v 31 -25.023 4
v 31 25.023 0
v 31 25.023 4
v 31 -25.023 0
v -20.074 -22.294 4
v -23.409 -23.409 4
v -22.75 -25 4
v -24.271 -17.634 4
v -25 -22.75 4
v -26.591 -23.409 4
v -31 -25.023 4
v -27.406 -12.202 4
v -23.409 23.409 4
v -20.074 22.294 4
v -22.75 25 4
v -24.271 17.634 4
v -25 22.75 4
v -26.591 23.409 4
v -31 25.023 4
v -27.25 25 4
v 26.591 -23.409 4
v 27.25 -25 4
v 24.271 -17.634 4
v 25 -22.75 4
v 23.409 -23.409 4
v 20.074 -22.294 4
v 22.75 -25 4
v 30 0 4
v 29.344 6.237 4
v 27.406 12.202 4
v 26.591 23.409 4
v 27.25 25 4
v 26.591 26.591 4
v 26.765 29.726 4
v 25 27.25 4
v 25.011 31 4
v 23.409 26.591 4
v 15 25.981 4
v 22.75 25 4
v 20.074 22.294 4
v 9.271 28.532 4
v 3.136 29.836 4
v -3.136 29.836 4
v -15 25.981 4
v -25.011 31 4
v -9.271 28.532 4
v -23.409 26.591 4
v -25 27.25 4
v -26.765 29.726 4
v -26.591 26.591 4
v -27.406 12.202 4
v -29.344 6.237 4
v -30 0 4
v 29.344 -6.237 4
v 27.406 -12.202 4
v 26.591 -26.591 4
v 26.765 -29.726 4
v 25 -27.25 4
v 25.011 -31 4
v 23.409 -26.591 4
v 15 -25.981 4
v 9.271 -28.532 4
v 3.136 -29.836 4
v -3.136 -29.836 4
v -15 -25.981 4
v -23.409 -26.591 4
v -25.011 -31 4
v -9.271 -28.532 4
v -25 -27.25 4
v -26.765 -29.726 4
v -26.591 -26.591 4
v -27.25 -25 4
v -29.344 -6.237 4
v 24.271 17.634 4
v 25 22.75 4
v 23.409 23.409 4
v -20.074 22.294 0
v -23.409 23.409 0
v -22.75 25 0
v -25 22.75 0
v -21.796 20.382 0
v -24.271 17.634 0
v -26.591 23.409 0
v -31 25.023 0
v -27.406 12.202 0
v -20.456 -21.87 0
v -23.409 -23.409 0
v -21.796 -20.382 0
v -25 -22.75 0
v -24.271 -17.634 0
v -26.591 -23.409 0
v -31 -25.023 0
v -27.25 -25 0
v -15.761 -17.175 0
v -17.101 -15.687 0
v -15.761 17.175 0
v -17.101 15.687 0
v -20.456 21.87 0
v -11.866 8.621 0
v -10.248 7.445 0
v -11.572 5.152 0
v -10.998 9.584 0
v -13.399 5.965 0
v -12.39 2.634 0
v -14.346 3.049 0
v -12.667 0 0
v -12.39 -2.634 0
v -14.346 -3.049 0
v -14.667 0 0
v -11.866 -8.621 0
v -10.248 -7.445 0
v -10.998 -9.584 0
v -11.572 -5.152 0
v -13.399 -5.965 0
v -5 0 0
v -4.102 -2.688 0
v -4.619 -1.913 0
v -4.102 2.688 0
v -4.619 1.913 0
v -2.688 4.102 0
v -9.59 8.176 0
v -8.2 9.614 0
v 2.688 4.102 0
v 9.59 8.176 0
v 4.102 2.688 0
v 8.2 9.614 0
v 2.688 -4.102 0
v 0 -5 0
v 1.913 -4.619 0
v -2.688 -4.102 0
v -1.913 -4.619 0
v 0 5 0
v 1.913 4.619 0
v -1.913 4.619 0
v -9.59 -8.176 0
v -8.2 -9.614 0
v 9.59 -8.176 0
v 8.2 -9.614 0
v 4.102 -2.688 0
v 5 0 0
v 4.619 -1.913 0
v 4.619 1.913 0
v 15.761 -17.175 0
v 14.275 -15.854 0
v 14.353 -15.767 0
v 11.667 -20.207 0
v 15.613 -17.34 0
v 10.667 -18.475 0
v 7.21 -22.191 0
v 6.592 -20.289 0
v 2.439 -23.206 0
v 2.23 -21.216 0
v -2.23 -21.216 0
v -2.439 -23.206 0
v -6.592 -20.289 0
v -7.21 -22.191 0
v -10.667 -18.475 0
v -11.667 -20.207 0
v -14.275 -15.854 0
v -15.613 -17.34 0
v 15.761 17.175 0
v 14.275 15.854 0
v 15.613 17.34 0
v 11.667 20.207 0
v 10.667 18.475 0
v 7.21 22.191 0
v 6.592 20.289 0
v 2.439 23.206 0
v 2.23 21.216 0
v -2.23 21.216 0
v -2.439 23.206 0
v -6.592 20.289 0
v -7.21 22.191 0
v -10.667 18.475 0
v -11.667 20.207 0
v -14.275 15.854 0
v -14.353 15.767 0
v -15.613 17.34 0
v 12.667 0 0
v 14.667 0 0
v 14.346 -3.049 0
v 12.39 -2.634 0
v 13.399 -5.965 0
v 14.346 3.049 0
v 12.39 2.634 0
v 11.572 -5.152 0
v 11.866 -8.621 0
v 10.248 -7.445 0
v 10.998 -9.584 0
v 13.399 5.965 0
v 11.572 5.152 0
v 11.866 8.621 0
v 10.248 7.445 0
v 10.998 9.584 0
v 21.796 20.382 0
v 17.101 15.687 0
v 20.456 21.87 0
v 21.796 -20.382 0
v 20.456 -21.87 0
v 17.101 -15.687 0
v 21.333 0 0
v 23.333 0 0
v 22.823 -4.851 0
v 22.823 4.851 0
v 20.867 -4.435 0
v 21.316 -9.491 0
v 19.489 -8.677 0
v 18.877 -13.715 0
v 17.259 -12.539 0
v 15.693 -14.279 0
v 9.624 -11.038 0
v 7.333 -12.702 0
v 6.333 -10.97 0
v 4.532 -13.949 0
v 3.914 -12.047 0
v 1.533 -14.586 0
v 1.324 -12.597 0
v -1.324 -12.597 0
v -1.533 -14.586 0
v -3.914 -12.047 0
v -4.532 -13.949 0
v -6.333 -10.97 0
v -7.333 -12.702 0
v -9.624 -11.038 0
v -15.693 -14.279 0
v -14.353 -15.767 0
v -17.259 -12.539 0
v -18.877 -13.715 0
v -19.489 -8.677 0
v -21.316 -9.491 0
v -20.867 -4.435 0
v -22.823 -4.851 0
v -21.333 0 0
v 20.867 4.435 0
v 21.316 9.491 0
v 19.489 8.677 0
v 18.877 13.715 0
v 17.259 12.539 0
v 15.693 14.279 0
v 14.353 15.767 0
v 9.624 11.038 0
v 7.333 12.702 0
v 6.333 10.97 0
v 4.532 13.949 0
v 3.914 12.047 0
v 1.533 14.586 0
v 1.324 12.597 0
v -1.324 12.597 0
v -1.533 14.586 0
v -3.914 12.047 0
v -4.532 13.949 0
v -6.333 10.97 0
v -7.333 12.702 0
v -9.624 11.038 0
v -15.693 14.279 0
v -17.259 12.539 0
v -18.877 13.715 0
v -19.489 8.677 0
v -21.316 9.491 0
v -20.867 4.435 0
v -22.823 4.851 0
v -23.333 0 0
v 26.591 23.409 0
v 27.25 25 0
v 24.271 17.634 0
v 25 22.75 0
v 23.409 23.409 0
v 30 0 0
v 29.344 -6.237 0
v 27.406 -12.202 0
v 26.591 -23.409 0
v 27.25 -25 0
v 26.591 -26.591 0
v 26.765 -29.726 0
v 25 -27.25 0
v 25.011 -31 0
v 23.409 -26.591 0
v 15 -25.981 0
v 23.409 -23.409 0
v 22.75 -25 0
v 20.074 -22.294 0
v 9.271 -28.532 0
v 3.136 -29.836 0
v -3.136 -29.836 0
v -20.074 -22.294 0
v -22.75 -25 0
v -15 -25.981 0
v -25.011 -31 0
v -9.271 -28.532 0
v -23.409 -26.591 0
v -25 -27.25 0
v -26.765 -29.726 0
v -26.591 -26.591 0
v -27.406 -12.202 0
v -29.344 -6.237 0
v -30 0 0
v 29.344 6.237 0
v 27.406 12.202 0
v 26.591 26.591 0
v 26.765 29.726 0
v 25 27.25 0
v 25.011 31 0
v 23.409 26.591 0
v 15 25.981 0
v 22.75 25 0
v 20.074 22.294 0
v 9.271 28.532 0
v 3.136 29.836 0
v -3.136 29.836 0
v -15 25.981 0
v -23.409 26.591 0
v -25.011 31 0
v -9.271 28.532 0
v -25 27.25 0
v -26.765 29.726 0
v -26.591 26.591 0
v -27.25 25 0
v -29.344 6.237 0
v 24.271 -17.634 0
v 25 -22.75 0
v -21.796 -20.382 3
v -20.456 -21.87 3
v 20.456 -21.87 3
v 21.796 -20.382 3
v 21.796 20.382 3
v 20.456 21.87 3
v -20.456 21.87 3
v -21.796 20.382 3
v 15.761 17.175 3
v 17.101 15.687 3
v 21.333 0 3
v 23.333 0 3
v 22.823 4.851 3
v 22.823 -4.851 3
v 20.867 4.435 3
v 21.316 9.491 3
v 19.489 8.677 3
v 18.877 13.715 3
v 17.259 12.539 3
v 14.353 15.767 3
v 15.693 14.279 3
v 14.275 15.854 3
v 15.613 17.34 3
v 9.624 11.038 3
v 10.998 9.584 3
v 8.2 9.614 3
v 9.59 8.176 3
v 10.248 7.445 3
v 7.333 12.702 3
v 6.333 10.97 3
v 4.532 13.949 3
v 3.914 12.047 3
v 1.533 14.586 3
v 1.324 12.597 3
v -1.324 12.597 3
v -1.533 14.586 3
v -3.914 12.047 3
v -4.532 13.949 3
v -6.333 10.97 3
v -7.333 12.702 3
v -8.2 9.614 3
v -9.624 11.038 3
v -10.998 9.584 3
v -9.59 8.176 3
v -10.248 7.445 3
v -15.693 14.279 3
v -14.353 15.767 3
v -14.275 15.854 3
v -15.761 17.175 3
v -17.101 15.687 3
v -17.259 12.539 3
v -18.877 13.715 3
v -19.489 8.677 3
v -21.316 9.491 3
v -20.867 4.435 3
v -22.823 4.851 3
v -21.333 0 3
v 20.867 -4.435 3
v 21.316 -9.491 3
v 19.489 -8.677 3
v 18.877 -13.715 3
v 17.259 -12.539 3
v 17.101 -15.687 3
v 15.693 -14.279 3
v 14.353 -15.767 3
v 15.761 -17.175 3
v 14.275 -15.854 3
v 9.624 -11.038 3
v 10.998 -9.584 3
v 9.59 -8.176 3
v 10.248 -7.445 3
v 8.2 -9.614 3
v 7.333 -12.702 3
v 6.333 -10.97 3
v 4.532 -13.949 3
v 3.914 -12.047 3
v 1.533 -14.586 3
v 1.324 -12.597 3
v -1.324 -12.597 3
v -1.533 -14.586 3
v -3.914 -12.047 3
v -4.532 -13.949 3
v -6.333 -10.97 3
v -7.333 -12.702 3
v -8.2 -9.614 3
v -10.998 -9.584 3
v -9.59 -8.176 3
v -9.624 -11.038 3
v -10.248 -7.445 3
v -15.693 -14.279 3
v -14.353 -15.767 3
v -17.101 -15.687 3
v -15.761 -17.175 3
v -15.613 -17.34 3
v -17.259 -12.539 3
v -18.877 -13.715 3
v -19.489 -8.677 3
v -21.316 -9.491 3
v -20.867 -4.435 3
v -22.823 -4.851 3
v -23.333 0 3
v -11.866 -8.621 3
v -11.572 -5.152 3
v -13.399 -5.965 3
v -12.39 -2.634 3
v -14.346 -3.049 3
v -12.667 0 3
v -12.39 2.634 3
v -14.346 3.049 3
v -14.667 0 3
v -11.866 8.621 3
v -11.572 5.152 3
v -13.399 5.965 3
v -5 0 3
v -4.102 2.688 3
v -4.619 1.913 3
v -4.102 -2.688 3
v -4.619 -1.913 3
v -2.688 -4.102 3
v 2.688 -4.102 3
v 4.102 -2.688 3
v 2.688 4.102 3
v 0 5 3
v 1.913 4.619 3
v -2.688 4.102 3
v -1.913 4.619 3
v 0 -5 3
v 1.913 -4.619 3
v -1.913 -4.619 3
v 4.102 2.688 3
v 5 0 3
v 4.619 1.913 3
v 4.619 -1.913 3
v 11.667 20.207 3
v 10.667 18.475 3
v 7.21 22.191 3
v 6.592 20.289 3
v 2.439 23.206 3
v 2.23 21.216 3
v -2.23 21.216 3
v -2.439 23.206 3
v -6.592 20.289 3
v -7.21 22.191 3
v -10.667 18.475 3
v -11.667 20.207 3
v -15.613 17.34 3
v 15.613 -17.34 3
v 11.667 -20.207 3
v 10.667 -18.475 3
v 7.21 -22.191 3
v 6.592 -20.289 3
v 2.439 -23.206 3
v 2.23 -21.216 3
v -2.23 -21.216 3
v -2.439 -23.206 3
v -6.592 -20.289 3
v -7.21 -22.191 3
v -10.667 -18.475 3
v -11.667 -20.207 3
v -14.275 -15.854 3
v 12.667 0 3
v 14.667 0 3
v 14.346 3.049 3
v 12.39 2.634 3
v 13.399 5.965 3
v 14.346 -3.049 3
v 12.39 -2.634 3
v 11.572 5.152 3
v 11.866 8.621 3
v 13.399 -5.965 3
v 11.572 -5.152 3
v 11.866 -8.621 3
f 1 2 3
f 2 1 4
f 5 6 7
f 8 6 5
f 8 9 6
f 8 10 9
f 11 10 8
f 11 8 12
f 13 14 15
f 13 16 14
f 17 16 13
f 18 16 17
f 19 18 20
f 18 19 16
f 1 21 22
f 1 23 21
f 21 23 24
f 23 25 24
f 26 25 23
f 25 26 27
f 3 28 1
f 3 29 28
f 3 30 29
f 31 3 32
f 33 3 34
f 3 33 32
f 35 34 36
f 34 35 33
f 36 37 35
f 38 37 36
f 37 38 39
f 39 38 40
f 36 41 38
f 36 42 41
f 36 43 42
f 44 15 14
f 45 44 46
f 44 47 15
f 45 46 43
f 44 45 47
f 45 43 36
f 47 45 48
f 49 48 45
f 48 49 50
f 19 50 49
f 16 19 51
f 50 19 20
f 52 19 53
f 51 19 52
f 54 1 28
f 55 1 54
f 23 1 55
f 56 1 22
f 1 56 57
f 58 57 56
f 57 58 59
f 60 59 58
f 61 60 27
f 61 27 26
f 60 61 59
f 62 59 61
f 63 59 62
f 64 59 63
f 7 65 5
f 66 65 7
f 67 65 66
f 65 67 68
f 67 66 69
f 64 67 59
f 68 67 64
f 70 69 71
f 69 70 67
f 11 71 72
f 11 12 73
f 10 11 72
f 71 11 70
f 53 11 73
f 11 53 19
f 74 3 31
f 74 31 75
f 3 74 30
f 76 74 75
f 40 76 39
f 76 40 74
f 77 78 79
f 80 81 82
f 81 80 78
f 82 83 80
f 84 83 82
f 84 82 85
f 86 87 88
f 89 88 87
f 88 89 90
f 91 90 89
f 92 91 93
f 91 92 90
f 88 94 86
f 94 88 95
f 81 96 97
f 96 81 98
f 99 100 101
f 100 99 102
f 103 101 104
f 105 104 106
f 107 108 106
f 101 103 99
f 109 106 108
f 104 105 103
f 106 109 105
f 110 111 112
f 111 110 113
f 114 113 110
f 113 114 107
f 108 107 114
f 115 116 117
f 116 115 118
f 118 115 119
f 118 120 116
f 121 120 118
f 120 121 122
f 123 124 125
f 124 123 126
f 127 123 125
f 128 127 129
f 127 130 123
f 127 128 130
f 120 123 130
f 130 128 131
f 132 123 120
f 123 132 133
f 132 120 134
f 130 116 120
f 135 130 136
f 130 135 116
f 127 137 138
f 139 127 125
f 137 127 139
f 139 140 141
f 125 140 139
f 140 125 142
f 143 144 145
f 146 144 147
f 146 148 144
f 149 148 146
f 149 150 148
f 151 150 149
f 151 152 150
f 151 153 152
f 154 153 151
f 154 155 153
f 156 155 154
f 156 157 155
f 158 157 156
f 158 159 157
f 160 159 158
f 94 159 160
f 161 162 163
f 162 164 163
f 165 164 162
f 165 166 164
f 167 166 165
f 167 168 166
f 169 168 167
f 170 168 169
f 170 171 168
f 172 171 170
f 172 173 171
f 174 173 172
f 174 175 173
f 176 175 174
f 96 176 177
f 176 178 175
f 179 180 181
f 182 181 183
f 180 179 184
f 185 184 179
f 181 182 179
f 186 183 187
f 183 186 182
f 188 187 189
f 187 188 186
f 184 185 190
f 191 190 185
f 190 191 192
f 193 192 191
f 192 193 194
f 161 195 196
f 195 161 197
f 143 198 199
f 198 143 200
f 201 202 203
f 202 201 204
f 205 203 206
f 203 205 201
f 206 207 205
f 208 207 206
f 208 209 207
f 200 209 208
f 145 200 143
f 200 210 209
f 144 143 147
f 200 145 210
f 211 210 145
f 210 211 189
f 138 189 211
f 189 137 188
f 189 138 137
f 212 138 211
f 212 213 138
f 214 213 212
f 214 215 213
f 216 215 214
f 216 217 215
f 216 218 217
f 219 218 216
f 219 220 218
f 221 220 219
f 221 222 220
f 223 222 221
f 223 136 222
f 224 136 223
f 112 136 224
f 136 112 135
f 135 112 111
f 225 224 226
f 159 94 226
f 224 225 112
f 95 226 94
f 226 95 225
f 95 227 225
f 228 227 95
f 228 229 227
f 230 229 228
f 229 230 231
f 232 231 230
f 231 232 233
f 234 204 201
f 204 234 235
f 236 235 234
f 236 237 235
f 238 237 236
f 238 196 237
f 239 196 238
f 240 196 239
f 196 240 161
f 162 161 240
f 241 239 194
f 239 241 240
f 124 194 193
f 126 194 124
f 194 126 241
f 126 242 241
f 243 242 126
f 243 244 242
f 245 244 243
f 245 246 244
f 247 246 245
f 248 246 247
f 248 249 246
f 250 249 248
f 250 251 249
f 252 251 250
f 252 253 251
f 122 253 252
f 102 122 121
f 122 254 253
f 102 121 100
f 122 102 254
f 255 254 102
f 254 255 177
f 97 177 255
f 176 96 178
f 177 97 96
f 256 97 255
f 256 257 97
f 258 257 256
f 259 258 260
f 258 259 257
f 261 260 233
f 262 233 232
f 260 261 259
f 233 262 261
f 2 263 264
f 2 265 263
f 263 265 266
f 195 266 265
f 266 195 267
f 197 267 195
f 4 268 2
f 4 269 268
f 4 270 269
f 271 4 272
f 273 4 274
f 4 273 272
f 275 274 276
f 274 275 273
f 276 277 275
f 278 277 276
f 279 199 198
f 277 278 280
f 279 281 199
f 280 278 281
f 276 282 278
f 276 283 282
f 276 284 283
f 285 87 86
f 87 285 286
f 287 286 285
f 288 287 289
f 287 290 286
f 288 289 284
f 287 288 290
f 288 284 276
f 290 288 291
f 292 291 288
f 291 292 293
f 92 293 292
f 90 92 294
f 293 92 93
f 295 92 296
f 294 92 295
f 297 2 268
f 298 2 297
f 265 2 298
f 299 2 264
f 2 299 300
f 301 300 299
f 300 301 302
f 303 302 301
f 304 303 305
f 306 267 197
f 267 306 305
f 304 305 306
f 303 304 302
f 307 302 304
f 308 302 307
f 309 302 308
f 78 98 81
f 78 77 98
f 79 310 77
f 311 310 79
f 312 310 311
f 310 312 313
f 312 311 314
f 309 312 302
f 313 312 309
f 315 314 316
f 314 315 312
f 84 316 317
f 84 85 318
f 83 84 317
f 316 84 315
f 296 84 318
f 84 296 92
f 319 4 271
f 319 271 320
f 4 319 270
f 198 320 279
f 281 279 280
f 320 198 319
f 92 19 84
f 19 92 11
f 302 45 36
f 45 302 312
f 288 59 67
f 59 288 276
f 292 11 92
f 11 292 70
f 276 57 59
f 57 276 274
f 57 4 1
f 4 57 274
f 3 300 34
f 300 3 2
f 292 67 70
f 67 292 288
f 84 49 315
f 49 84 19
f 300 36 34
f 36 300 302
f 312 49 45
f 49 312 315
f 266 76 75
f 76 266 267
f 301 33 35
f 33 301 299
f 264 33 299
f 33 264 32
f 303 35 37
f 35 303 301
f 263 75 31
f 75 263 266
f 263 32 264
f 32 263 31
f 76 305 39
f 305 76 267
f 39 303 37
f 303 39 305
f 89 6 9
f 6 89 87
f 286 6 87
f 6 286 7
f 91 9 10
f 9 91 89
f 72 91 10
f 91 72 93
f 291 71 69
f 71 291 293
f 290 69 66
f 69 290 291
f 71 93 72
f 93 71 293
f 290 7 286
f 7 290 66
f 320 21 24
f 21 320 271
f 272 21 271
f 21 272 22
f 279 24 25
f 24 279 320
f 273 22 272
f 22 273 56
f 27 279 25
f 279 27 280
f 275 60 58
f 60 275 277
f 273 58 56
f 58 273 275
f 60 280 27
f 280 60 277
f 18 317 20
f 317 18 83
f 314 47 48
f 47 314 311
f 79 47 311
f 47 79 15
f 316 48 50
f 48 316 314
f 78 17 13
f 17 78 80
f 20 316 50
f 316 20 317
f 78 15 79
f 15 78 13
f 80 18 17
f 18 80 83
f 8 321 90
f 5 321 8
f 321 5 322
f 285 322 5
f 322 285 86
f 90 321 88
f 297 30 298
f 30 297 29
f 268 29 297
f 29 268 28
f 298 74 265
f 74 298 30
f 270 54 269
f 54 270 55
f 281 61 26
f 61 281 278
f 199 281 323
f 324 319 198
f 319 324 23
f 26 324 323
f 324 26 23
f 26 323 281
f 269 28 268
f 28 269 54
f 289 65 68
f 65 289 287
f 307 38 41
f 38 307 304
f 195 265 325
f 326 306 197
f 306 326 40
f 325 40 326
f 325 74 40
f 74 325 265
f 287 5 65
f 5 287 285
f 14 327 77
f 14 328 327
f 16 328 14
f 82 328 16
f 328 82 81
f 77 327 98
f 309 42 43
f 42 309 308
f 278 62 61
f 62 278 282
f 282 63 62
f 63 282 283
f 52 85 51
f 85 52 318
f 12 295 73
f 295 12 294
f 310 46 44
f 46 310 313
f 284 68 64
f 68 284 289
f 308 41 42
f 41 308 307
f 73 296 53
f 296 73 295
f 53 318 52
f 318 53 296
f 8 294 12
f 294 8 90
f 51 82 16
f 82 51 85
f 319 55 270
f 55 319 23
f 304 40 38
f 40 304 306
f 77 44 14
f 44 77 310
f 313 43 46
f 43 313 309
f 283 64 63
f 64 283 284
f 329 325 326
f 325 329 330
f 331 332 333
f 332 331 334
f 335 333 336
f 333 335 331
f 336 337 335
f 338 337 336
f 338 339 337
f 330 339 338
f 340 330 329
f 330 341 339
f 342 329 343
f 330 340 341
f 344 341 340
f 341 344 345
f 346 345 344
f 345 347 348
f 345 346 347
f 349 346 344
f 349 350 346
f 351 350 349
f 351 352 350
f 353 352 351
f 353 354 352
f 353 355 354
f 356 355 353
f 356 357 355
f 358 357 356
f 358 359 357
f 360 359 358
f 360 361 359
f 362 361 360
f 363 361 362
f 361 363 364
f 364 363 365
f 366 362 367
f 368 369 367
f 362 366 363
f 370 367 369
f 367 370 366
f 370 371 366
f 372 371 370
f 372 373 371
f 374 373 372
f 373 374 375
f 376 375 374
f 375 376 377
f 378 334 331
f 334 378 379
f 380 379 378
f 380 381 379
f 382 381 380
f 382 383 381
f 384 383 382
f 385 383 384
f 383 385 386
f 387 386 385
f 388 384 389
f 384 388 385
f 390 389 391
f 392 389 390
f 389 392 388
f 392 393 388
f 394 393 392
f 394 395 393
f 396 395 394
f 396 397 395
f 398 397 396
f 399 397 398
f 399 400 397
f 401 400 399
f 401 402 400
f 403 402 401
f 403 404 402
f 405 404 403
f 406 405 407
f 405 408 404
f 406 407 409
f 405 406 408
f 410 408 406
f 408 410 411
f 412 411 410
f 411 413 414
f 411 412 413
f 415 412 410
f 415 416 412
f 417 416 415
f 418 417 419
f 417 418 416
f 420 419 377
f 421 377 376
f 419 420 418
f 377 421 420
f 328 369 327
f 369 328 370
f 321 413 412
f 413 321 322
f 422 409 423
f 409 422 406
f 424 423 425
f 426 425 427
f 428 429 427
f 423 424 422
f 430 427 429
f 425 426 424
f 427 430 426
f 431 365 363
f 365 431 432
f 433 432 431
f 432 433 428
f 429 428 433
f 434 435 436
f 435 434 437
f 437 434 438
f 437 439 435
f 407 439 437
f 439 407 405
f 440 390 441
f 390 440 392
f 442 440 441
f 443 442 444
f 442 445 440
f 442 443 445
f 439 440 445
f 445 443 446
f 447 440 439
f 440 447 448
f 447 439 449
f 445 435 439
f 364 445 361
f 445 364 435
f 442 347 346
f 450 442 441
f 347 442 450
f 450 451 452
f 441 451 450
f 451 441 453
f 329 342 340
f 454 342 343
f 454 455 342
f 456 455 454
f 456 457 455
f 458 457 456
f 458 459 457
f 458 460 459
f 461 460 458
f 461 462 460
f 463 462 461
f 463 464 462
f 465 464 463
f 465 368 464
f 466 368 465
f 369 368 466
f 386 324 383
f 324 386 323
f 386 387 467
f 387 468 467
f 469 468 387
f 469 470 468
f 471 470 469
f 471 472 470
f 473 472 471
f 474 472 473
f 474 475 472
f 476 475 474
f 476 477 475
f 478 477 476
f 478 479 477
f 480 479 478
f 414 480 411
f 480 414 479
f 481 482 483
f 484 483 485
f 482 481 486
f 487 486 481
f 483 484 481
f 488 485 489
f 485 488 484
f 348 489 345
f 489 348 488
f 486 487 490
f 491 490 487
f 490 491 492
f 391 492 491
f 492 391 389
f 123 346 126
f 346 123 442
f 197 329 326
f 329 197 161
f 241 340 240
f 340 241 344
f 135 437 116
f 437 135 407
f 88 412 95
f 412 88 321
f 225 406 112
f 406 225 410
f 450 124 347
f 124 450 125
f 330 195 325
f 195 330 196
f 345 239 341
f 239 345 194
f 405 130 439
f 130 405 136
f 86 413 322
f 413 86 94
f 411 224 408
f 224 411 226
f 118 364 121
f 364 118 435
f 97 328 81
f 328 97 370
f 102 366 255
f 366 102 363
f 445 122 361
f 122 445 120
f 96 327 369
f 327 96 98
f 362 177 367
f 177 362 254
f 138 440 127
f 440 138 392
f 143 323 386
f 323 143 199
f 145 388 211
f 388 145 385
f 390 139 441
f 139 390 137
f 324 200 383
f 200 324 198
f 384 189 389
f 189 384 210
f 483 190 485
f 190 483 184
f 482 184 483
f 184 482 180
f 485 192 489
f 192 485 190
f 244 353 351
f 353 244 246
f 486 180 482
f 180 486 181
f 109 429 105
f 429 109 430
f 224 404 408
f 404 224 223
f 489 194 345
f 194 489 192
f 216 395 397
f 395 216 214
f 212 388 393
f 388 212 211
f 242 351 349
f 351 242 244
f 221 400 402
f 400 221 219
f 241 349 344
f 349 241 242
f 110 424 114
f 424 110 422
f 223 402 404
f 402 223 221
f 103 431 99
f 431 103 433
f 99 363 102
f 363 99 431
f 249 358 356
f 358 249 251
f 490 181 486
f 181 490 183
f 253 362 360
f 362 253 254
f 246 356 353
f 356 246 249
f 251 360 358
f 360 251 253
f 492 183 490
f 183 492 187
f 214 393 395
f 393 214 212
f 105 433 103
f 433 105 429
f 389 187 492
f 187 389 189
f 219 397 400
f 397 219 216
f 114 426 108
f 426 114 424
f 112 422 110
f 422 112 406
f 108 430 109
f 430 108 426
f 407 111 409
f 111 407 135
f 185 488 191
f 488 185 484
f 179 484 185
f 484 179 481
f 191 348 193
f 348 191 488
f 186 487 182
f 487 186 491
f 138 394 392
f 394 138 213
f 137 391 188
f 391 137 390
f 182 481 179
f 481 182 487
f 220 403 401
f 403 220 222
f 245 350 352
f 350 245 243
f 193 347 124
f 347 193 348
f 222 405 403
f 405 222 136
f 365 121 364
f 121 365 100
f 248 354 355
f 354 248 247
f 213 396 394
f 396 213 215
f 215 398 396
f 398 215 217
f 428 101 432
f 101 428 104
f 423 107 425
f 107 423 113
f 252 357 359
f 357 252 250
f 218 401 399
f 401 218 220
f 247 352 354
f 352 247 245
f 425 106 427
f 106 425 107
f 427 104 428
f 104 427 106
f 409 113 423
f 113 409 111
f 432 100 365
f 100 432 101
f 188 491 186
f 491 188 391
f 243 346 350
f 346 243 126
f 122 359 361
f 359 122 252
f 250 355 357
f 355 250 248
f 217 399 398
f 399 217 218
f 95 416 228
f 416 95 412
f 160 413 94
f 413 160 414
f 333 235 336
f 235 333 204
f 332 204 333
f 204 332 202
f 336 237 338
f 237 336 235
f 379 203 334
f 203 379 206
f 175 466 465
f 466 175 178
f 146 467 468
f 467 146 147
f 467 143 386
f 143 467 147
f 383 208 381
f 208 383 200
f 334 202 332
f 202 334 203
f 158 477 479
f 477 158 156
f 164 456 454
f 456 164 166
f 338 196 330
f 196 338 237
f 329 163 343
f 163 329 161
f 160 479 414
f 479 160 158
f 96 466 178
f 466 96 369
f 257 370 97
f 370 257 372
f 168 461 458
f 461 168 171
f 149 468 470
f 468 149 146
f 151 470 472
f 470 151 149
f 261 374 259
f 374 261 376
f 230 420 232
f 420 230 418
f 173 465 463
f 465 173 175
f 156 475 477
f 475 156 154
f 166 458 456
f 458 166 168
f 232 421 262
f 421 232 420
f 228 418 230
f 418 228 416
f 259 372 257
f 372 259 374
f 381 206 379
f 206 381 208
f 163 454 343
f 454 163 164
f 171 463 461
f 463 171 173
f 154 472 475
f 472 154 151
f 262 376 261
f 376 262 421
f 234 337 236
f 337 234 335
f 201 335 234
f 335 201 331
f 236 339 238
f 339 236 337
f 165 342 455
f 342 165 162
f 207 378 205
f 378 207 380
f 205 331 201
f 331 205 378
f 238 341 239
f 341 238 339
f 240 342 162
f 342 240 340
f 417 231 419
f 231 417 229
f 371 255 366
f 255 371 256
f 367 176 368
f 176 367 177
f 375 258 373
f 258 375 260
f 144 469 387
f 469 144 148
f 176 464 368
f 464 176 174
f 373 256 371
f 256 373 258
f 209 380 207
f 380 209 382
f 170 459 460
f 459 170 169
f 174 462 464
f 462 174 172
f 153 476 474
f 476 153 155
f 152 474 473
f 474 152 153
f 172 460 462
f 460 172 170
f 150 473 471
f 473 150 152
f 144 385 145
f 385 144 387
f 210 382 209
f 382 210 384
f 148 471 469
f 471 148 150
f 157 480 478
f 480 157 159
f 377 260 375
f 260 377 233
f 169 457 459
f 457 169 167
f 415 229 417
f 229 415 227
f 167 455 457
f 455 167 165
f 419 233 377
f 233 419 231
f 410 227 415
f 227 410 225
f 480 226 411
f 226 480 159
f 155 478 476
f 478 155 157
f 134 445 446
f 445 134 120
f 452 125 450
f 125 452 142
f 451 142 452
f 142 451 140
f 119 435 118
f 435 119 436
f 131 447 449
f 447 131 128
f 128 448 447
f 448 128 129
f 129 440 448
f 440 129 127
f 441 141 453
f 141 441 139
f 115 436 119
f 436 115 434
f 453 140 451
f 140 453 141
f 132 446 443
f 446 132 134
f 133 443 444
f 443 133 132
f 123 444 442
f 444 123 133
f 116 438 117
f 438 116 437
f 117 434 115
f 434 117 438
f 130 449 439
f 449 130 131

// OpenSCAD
// Parametric fan grille
// Revision history:
// Original version: John Ridley Sept 25 2011

// these numbers are good for a 60mm fan
// measurements are in millimeters
hole_spacing = 50;
hole_size = 4.5;	// screw hole size
outer_size = 62;	// size of outer square
corner_cut_radius = 40;	// radius of circle drawn around square to round off the corners
outer_circle_diameter = 60;	// diameter of actual fan
inner_circle_diameter = 10;	// diameter of center support circle
outer_thickness = 4;		// Thickness of square outer frame
inner_thickness = 3;		// Vane thickness - should be less than outer_thickness so the fan blades will not hit

vane_count = 4;			// whatever you like here.
vane_width = 2;
ring_count = 2;
ring_width = 2;


// some calculated values
vane_angle = 360 / vane_count;
// ring_spacing defines the CENTER of each ring (radius)
ring_spacing = (outer_circle_diameter - inner_circle_diameter+ring_width)/(ring_count+1)/2;
//ring_spacing = outer_circle_diameter;
cpu_fan_grille();

module cpu_fan_grille()
{
	union()
	{
	// outer mounting ring is a cube minus the cutouts
	difference()
	{
		intersection()
		{
			translate(v=[-outer_size/2, -outer_size/2,0])
				cube(size=[outer_size, outer_size, outer_thickness]);
			cylinder(r=corner_cut_radius, h=outer_thickness);
		}
		// cut the screw holes
		translate(v=[hole_spacing/2, hole_spacing/2, 0])
			cylinder(h=outer_thickness, r=hole_size/2);
		translate(v=[-hole_spacing/2,- hole_spacing/2, 0])
			cylinder(h=outer_thickness, r=hole_size/2);
		translate(v=[hole_spacing/2,- hole_spacing/2, 0])
			cylinder(h=outer_thickness, r=hole_size/2);
		translate(v=[-hole_spacing/2, hole_spacing/2, 0])
			cylinder(h=outer_thickness, r=hole_size/2);

		// cut the main center hole
		cylinder(h=outer_thickness, r=outer_circle_diameter/2);
	}
	// the inner circle
	cylinder(h=inner_thickness, r=inner_circle_diameter/2);
	// rotate for aesthetics
	rotate([0,0,vane_angle/2])
	for (angle = [0 : vane_angle : 360] )
	{
		rotate([0,0,angle])
		translate(v=[0,-vane_width/2,0])
		cube(size=[outer_circle_diameter/2, vane_width, inner_thickness]);
	}
	// circles
	for (x = [1 : ring_count ])
	{
		difference()
		{
			cylinder(h=inner_thickness, r=inner_circle_diameter/2 + (ring_spacing * x) + (ring_width/2));
			cylinder(h=inner_thickness, r=inner_circle_diameter/2 + (ring_spacing * x) - (ring_width/2));
		}
	}
	}
}
